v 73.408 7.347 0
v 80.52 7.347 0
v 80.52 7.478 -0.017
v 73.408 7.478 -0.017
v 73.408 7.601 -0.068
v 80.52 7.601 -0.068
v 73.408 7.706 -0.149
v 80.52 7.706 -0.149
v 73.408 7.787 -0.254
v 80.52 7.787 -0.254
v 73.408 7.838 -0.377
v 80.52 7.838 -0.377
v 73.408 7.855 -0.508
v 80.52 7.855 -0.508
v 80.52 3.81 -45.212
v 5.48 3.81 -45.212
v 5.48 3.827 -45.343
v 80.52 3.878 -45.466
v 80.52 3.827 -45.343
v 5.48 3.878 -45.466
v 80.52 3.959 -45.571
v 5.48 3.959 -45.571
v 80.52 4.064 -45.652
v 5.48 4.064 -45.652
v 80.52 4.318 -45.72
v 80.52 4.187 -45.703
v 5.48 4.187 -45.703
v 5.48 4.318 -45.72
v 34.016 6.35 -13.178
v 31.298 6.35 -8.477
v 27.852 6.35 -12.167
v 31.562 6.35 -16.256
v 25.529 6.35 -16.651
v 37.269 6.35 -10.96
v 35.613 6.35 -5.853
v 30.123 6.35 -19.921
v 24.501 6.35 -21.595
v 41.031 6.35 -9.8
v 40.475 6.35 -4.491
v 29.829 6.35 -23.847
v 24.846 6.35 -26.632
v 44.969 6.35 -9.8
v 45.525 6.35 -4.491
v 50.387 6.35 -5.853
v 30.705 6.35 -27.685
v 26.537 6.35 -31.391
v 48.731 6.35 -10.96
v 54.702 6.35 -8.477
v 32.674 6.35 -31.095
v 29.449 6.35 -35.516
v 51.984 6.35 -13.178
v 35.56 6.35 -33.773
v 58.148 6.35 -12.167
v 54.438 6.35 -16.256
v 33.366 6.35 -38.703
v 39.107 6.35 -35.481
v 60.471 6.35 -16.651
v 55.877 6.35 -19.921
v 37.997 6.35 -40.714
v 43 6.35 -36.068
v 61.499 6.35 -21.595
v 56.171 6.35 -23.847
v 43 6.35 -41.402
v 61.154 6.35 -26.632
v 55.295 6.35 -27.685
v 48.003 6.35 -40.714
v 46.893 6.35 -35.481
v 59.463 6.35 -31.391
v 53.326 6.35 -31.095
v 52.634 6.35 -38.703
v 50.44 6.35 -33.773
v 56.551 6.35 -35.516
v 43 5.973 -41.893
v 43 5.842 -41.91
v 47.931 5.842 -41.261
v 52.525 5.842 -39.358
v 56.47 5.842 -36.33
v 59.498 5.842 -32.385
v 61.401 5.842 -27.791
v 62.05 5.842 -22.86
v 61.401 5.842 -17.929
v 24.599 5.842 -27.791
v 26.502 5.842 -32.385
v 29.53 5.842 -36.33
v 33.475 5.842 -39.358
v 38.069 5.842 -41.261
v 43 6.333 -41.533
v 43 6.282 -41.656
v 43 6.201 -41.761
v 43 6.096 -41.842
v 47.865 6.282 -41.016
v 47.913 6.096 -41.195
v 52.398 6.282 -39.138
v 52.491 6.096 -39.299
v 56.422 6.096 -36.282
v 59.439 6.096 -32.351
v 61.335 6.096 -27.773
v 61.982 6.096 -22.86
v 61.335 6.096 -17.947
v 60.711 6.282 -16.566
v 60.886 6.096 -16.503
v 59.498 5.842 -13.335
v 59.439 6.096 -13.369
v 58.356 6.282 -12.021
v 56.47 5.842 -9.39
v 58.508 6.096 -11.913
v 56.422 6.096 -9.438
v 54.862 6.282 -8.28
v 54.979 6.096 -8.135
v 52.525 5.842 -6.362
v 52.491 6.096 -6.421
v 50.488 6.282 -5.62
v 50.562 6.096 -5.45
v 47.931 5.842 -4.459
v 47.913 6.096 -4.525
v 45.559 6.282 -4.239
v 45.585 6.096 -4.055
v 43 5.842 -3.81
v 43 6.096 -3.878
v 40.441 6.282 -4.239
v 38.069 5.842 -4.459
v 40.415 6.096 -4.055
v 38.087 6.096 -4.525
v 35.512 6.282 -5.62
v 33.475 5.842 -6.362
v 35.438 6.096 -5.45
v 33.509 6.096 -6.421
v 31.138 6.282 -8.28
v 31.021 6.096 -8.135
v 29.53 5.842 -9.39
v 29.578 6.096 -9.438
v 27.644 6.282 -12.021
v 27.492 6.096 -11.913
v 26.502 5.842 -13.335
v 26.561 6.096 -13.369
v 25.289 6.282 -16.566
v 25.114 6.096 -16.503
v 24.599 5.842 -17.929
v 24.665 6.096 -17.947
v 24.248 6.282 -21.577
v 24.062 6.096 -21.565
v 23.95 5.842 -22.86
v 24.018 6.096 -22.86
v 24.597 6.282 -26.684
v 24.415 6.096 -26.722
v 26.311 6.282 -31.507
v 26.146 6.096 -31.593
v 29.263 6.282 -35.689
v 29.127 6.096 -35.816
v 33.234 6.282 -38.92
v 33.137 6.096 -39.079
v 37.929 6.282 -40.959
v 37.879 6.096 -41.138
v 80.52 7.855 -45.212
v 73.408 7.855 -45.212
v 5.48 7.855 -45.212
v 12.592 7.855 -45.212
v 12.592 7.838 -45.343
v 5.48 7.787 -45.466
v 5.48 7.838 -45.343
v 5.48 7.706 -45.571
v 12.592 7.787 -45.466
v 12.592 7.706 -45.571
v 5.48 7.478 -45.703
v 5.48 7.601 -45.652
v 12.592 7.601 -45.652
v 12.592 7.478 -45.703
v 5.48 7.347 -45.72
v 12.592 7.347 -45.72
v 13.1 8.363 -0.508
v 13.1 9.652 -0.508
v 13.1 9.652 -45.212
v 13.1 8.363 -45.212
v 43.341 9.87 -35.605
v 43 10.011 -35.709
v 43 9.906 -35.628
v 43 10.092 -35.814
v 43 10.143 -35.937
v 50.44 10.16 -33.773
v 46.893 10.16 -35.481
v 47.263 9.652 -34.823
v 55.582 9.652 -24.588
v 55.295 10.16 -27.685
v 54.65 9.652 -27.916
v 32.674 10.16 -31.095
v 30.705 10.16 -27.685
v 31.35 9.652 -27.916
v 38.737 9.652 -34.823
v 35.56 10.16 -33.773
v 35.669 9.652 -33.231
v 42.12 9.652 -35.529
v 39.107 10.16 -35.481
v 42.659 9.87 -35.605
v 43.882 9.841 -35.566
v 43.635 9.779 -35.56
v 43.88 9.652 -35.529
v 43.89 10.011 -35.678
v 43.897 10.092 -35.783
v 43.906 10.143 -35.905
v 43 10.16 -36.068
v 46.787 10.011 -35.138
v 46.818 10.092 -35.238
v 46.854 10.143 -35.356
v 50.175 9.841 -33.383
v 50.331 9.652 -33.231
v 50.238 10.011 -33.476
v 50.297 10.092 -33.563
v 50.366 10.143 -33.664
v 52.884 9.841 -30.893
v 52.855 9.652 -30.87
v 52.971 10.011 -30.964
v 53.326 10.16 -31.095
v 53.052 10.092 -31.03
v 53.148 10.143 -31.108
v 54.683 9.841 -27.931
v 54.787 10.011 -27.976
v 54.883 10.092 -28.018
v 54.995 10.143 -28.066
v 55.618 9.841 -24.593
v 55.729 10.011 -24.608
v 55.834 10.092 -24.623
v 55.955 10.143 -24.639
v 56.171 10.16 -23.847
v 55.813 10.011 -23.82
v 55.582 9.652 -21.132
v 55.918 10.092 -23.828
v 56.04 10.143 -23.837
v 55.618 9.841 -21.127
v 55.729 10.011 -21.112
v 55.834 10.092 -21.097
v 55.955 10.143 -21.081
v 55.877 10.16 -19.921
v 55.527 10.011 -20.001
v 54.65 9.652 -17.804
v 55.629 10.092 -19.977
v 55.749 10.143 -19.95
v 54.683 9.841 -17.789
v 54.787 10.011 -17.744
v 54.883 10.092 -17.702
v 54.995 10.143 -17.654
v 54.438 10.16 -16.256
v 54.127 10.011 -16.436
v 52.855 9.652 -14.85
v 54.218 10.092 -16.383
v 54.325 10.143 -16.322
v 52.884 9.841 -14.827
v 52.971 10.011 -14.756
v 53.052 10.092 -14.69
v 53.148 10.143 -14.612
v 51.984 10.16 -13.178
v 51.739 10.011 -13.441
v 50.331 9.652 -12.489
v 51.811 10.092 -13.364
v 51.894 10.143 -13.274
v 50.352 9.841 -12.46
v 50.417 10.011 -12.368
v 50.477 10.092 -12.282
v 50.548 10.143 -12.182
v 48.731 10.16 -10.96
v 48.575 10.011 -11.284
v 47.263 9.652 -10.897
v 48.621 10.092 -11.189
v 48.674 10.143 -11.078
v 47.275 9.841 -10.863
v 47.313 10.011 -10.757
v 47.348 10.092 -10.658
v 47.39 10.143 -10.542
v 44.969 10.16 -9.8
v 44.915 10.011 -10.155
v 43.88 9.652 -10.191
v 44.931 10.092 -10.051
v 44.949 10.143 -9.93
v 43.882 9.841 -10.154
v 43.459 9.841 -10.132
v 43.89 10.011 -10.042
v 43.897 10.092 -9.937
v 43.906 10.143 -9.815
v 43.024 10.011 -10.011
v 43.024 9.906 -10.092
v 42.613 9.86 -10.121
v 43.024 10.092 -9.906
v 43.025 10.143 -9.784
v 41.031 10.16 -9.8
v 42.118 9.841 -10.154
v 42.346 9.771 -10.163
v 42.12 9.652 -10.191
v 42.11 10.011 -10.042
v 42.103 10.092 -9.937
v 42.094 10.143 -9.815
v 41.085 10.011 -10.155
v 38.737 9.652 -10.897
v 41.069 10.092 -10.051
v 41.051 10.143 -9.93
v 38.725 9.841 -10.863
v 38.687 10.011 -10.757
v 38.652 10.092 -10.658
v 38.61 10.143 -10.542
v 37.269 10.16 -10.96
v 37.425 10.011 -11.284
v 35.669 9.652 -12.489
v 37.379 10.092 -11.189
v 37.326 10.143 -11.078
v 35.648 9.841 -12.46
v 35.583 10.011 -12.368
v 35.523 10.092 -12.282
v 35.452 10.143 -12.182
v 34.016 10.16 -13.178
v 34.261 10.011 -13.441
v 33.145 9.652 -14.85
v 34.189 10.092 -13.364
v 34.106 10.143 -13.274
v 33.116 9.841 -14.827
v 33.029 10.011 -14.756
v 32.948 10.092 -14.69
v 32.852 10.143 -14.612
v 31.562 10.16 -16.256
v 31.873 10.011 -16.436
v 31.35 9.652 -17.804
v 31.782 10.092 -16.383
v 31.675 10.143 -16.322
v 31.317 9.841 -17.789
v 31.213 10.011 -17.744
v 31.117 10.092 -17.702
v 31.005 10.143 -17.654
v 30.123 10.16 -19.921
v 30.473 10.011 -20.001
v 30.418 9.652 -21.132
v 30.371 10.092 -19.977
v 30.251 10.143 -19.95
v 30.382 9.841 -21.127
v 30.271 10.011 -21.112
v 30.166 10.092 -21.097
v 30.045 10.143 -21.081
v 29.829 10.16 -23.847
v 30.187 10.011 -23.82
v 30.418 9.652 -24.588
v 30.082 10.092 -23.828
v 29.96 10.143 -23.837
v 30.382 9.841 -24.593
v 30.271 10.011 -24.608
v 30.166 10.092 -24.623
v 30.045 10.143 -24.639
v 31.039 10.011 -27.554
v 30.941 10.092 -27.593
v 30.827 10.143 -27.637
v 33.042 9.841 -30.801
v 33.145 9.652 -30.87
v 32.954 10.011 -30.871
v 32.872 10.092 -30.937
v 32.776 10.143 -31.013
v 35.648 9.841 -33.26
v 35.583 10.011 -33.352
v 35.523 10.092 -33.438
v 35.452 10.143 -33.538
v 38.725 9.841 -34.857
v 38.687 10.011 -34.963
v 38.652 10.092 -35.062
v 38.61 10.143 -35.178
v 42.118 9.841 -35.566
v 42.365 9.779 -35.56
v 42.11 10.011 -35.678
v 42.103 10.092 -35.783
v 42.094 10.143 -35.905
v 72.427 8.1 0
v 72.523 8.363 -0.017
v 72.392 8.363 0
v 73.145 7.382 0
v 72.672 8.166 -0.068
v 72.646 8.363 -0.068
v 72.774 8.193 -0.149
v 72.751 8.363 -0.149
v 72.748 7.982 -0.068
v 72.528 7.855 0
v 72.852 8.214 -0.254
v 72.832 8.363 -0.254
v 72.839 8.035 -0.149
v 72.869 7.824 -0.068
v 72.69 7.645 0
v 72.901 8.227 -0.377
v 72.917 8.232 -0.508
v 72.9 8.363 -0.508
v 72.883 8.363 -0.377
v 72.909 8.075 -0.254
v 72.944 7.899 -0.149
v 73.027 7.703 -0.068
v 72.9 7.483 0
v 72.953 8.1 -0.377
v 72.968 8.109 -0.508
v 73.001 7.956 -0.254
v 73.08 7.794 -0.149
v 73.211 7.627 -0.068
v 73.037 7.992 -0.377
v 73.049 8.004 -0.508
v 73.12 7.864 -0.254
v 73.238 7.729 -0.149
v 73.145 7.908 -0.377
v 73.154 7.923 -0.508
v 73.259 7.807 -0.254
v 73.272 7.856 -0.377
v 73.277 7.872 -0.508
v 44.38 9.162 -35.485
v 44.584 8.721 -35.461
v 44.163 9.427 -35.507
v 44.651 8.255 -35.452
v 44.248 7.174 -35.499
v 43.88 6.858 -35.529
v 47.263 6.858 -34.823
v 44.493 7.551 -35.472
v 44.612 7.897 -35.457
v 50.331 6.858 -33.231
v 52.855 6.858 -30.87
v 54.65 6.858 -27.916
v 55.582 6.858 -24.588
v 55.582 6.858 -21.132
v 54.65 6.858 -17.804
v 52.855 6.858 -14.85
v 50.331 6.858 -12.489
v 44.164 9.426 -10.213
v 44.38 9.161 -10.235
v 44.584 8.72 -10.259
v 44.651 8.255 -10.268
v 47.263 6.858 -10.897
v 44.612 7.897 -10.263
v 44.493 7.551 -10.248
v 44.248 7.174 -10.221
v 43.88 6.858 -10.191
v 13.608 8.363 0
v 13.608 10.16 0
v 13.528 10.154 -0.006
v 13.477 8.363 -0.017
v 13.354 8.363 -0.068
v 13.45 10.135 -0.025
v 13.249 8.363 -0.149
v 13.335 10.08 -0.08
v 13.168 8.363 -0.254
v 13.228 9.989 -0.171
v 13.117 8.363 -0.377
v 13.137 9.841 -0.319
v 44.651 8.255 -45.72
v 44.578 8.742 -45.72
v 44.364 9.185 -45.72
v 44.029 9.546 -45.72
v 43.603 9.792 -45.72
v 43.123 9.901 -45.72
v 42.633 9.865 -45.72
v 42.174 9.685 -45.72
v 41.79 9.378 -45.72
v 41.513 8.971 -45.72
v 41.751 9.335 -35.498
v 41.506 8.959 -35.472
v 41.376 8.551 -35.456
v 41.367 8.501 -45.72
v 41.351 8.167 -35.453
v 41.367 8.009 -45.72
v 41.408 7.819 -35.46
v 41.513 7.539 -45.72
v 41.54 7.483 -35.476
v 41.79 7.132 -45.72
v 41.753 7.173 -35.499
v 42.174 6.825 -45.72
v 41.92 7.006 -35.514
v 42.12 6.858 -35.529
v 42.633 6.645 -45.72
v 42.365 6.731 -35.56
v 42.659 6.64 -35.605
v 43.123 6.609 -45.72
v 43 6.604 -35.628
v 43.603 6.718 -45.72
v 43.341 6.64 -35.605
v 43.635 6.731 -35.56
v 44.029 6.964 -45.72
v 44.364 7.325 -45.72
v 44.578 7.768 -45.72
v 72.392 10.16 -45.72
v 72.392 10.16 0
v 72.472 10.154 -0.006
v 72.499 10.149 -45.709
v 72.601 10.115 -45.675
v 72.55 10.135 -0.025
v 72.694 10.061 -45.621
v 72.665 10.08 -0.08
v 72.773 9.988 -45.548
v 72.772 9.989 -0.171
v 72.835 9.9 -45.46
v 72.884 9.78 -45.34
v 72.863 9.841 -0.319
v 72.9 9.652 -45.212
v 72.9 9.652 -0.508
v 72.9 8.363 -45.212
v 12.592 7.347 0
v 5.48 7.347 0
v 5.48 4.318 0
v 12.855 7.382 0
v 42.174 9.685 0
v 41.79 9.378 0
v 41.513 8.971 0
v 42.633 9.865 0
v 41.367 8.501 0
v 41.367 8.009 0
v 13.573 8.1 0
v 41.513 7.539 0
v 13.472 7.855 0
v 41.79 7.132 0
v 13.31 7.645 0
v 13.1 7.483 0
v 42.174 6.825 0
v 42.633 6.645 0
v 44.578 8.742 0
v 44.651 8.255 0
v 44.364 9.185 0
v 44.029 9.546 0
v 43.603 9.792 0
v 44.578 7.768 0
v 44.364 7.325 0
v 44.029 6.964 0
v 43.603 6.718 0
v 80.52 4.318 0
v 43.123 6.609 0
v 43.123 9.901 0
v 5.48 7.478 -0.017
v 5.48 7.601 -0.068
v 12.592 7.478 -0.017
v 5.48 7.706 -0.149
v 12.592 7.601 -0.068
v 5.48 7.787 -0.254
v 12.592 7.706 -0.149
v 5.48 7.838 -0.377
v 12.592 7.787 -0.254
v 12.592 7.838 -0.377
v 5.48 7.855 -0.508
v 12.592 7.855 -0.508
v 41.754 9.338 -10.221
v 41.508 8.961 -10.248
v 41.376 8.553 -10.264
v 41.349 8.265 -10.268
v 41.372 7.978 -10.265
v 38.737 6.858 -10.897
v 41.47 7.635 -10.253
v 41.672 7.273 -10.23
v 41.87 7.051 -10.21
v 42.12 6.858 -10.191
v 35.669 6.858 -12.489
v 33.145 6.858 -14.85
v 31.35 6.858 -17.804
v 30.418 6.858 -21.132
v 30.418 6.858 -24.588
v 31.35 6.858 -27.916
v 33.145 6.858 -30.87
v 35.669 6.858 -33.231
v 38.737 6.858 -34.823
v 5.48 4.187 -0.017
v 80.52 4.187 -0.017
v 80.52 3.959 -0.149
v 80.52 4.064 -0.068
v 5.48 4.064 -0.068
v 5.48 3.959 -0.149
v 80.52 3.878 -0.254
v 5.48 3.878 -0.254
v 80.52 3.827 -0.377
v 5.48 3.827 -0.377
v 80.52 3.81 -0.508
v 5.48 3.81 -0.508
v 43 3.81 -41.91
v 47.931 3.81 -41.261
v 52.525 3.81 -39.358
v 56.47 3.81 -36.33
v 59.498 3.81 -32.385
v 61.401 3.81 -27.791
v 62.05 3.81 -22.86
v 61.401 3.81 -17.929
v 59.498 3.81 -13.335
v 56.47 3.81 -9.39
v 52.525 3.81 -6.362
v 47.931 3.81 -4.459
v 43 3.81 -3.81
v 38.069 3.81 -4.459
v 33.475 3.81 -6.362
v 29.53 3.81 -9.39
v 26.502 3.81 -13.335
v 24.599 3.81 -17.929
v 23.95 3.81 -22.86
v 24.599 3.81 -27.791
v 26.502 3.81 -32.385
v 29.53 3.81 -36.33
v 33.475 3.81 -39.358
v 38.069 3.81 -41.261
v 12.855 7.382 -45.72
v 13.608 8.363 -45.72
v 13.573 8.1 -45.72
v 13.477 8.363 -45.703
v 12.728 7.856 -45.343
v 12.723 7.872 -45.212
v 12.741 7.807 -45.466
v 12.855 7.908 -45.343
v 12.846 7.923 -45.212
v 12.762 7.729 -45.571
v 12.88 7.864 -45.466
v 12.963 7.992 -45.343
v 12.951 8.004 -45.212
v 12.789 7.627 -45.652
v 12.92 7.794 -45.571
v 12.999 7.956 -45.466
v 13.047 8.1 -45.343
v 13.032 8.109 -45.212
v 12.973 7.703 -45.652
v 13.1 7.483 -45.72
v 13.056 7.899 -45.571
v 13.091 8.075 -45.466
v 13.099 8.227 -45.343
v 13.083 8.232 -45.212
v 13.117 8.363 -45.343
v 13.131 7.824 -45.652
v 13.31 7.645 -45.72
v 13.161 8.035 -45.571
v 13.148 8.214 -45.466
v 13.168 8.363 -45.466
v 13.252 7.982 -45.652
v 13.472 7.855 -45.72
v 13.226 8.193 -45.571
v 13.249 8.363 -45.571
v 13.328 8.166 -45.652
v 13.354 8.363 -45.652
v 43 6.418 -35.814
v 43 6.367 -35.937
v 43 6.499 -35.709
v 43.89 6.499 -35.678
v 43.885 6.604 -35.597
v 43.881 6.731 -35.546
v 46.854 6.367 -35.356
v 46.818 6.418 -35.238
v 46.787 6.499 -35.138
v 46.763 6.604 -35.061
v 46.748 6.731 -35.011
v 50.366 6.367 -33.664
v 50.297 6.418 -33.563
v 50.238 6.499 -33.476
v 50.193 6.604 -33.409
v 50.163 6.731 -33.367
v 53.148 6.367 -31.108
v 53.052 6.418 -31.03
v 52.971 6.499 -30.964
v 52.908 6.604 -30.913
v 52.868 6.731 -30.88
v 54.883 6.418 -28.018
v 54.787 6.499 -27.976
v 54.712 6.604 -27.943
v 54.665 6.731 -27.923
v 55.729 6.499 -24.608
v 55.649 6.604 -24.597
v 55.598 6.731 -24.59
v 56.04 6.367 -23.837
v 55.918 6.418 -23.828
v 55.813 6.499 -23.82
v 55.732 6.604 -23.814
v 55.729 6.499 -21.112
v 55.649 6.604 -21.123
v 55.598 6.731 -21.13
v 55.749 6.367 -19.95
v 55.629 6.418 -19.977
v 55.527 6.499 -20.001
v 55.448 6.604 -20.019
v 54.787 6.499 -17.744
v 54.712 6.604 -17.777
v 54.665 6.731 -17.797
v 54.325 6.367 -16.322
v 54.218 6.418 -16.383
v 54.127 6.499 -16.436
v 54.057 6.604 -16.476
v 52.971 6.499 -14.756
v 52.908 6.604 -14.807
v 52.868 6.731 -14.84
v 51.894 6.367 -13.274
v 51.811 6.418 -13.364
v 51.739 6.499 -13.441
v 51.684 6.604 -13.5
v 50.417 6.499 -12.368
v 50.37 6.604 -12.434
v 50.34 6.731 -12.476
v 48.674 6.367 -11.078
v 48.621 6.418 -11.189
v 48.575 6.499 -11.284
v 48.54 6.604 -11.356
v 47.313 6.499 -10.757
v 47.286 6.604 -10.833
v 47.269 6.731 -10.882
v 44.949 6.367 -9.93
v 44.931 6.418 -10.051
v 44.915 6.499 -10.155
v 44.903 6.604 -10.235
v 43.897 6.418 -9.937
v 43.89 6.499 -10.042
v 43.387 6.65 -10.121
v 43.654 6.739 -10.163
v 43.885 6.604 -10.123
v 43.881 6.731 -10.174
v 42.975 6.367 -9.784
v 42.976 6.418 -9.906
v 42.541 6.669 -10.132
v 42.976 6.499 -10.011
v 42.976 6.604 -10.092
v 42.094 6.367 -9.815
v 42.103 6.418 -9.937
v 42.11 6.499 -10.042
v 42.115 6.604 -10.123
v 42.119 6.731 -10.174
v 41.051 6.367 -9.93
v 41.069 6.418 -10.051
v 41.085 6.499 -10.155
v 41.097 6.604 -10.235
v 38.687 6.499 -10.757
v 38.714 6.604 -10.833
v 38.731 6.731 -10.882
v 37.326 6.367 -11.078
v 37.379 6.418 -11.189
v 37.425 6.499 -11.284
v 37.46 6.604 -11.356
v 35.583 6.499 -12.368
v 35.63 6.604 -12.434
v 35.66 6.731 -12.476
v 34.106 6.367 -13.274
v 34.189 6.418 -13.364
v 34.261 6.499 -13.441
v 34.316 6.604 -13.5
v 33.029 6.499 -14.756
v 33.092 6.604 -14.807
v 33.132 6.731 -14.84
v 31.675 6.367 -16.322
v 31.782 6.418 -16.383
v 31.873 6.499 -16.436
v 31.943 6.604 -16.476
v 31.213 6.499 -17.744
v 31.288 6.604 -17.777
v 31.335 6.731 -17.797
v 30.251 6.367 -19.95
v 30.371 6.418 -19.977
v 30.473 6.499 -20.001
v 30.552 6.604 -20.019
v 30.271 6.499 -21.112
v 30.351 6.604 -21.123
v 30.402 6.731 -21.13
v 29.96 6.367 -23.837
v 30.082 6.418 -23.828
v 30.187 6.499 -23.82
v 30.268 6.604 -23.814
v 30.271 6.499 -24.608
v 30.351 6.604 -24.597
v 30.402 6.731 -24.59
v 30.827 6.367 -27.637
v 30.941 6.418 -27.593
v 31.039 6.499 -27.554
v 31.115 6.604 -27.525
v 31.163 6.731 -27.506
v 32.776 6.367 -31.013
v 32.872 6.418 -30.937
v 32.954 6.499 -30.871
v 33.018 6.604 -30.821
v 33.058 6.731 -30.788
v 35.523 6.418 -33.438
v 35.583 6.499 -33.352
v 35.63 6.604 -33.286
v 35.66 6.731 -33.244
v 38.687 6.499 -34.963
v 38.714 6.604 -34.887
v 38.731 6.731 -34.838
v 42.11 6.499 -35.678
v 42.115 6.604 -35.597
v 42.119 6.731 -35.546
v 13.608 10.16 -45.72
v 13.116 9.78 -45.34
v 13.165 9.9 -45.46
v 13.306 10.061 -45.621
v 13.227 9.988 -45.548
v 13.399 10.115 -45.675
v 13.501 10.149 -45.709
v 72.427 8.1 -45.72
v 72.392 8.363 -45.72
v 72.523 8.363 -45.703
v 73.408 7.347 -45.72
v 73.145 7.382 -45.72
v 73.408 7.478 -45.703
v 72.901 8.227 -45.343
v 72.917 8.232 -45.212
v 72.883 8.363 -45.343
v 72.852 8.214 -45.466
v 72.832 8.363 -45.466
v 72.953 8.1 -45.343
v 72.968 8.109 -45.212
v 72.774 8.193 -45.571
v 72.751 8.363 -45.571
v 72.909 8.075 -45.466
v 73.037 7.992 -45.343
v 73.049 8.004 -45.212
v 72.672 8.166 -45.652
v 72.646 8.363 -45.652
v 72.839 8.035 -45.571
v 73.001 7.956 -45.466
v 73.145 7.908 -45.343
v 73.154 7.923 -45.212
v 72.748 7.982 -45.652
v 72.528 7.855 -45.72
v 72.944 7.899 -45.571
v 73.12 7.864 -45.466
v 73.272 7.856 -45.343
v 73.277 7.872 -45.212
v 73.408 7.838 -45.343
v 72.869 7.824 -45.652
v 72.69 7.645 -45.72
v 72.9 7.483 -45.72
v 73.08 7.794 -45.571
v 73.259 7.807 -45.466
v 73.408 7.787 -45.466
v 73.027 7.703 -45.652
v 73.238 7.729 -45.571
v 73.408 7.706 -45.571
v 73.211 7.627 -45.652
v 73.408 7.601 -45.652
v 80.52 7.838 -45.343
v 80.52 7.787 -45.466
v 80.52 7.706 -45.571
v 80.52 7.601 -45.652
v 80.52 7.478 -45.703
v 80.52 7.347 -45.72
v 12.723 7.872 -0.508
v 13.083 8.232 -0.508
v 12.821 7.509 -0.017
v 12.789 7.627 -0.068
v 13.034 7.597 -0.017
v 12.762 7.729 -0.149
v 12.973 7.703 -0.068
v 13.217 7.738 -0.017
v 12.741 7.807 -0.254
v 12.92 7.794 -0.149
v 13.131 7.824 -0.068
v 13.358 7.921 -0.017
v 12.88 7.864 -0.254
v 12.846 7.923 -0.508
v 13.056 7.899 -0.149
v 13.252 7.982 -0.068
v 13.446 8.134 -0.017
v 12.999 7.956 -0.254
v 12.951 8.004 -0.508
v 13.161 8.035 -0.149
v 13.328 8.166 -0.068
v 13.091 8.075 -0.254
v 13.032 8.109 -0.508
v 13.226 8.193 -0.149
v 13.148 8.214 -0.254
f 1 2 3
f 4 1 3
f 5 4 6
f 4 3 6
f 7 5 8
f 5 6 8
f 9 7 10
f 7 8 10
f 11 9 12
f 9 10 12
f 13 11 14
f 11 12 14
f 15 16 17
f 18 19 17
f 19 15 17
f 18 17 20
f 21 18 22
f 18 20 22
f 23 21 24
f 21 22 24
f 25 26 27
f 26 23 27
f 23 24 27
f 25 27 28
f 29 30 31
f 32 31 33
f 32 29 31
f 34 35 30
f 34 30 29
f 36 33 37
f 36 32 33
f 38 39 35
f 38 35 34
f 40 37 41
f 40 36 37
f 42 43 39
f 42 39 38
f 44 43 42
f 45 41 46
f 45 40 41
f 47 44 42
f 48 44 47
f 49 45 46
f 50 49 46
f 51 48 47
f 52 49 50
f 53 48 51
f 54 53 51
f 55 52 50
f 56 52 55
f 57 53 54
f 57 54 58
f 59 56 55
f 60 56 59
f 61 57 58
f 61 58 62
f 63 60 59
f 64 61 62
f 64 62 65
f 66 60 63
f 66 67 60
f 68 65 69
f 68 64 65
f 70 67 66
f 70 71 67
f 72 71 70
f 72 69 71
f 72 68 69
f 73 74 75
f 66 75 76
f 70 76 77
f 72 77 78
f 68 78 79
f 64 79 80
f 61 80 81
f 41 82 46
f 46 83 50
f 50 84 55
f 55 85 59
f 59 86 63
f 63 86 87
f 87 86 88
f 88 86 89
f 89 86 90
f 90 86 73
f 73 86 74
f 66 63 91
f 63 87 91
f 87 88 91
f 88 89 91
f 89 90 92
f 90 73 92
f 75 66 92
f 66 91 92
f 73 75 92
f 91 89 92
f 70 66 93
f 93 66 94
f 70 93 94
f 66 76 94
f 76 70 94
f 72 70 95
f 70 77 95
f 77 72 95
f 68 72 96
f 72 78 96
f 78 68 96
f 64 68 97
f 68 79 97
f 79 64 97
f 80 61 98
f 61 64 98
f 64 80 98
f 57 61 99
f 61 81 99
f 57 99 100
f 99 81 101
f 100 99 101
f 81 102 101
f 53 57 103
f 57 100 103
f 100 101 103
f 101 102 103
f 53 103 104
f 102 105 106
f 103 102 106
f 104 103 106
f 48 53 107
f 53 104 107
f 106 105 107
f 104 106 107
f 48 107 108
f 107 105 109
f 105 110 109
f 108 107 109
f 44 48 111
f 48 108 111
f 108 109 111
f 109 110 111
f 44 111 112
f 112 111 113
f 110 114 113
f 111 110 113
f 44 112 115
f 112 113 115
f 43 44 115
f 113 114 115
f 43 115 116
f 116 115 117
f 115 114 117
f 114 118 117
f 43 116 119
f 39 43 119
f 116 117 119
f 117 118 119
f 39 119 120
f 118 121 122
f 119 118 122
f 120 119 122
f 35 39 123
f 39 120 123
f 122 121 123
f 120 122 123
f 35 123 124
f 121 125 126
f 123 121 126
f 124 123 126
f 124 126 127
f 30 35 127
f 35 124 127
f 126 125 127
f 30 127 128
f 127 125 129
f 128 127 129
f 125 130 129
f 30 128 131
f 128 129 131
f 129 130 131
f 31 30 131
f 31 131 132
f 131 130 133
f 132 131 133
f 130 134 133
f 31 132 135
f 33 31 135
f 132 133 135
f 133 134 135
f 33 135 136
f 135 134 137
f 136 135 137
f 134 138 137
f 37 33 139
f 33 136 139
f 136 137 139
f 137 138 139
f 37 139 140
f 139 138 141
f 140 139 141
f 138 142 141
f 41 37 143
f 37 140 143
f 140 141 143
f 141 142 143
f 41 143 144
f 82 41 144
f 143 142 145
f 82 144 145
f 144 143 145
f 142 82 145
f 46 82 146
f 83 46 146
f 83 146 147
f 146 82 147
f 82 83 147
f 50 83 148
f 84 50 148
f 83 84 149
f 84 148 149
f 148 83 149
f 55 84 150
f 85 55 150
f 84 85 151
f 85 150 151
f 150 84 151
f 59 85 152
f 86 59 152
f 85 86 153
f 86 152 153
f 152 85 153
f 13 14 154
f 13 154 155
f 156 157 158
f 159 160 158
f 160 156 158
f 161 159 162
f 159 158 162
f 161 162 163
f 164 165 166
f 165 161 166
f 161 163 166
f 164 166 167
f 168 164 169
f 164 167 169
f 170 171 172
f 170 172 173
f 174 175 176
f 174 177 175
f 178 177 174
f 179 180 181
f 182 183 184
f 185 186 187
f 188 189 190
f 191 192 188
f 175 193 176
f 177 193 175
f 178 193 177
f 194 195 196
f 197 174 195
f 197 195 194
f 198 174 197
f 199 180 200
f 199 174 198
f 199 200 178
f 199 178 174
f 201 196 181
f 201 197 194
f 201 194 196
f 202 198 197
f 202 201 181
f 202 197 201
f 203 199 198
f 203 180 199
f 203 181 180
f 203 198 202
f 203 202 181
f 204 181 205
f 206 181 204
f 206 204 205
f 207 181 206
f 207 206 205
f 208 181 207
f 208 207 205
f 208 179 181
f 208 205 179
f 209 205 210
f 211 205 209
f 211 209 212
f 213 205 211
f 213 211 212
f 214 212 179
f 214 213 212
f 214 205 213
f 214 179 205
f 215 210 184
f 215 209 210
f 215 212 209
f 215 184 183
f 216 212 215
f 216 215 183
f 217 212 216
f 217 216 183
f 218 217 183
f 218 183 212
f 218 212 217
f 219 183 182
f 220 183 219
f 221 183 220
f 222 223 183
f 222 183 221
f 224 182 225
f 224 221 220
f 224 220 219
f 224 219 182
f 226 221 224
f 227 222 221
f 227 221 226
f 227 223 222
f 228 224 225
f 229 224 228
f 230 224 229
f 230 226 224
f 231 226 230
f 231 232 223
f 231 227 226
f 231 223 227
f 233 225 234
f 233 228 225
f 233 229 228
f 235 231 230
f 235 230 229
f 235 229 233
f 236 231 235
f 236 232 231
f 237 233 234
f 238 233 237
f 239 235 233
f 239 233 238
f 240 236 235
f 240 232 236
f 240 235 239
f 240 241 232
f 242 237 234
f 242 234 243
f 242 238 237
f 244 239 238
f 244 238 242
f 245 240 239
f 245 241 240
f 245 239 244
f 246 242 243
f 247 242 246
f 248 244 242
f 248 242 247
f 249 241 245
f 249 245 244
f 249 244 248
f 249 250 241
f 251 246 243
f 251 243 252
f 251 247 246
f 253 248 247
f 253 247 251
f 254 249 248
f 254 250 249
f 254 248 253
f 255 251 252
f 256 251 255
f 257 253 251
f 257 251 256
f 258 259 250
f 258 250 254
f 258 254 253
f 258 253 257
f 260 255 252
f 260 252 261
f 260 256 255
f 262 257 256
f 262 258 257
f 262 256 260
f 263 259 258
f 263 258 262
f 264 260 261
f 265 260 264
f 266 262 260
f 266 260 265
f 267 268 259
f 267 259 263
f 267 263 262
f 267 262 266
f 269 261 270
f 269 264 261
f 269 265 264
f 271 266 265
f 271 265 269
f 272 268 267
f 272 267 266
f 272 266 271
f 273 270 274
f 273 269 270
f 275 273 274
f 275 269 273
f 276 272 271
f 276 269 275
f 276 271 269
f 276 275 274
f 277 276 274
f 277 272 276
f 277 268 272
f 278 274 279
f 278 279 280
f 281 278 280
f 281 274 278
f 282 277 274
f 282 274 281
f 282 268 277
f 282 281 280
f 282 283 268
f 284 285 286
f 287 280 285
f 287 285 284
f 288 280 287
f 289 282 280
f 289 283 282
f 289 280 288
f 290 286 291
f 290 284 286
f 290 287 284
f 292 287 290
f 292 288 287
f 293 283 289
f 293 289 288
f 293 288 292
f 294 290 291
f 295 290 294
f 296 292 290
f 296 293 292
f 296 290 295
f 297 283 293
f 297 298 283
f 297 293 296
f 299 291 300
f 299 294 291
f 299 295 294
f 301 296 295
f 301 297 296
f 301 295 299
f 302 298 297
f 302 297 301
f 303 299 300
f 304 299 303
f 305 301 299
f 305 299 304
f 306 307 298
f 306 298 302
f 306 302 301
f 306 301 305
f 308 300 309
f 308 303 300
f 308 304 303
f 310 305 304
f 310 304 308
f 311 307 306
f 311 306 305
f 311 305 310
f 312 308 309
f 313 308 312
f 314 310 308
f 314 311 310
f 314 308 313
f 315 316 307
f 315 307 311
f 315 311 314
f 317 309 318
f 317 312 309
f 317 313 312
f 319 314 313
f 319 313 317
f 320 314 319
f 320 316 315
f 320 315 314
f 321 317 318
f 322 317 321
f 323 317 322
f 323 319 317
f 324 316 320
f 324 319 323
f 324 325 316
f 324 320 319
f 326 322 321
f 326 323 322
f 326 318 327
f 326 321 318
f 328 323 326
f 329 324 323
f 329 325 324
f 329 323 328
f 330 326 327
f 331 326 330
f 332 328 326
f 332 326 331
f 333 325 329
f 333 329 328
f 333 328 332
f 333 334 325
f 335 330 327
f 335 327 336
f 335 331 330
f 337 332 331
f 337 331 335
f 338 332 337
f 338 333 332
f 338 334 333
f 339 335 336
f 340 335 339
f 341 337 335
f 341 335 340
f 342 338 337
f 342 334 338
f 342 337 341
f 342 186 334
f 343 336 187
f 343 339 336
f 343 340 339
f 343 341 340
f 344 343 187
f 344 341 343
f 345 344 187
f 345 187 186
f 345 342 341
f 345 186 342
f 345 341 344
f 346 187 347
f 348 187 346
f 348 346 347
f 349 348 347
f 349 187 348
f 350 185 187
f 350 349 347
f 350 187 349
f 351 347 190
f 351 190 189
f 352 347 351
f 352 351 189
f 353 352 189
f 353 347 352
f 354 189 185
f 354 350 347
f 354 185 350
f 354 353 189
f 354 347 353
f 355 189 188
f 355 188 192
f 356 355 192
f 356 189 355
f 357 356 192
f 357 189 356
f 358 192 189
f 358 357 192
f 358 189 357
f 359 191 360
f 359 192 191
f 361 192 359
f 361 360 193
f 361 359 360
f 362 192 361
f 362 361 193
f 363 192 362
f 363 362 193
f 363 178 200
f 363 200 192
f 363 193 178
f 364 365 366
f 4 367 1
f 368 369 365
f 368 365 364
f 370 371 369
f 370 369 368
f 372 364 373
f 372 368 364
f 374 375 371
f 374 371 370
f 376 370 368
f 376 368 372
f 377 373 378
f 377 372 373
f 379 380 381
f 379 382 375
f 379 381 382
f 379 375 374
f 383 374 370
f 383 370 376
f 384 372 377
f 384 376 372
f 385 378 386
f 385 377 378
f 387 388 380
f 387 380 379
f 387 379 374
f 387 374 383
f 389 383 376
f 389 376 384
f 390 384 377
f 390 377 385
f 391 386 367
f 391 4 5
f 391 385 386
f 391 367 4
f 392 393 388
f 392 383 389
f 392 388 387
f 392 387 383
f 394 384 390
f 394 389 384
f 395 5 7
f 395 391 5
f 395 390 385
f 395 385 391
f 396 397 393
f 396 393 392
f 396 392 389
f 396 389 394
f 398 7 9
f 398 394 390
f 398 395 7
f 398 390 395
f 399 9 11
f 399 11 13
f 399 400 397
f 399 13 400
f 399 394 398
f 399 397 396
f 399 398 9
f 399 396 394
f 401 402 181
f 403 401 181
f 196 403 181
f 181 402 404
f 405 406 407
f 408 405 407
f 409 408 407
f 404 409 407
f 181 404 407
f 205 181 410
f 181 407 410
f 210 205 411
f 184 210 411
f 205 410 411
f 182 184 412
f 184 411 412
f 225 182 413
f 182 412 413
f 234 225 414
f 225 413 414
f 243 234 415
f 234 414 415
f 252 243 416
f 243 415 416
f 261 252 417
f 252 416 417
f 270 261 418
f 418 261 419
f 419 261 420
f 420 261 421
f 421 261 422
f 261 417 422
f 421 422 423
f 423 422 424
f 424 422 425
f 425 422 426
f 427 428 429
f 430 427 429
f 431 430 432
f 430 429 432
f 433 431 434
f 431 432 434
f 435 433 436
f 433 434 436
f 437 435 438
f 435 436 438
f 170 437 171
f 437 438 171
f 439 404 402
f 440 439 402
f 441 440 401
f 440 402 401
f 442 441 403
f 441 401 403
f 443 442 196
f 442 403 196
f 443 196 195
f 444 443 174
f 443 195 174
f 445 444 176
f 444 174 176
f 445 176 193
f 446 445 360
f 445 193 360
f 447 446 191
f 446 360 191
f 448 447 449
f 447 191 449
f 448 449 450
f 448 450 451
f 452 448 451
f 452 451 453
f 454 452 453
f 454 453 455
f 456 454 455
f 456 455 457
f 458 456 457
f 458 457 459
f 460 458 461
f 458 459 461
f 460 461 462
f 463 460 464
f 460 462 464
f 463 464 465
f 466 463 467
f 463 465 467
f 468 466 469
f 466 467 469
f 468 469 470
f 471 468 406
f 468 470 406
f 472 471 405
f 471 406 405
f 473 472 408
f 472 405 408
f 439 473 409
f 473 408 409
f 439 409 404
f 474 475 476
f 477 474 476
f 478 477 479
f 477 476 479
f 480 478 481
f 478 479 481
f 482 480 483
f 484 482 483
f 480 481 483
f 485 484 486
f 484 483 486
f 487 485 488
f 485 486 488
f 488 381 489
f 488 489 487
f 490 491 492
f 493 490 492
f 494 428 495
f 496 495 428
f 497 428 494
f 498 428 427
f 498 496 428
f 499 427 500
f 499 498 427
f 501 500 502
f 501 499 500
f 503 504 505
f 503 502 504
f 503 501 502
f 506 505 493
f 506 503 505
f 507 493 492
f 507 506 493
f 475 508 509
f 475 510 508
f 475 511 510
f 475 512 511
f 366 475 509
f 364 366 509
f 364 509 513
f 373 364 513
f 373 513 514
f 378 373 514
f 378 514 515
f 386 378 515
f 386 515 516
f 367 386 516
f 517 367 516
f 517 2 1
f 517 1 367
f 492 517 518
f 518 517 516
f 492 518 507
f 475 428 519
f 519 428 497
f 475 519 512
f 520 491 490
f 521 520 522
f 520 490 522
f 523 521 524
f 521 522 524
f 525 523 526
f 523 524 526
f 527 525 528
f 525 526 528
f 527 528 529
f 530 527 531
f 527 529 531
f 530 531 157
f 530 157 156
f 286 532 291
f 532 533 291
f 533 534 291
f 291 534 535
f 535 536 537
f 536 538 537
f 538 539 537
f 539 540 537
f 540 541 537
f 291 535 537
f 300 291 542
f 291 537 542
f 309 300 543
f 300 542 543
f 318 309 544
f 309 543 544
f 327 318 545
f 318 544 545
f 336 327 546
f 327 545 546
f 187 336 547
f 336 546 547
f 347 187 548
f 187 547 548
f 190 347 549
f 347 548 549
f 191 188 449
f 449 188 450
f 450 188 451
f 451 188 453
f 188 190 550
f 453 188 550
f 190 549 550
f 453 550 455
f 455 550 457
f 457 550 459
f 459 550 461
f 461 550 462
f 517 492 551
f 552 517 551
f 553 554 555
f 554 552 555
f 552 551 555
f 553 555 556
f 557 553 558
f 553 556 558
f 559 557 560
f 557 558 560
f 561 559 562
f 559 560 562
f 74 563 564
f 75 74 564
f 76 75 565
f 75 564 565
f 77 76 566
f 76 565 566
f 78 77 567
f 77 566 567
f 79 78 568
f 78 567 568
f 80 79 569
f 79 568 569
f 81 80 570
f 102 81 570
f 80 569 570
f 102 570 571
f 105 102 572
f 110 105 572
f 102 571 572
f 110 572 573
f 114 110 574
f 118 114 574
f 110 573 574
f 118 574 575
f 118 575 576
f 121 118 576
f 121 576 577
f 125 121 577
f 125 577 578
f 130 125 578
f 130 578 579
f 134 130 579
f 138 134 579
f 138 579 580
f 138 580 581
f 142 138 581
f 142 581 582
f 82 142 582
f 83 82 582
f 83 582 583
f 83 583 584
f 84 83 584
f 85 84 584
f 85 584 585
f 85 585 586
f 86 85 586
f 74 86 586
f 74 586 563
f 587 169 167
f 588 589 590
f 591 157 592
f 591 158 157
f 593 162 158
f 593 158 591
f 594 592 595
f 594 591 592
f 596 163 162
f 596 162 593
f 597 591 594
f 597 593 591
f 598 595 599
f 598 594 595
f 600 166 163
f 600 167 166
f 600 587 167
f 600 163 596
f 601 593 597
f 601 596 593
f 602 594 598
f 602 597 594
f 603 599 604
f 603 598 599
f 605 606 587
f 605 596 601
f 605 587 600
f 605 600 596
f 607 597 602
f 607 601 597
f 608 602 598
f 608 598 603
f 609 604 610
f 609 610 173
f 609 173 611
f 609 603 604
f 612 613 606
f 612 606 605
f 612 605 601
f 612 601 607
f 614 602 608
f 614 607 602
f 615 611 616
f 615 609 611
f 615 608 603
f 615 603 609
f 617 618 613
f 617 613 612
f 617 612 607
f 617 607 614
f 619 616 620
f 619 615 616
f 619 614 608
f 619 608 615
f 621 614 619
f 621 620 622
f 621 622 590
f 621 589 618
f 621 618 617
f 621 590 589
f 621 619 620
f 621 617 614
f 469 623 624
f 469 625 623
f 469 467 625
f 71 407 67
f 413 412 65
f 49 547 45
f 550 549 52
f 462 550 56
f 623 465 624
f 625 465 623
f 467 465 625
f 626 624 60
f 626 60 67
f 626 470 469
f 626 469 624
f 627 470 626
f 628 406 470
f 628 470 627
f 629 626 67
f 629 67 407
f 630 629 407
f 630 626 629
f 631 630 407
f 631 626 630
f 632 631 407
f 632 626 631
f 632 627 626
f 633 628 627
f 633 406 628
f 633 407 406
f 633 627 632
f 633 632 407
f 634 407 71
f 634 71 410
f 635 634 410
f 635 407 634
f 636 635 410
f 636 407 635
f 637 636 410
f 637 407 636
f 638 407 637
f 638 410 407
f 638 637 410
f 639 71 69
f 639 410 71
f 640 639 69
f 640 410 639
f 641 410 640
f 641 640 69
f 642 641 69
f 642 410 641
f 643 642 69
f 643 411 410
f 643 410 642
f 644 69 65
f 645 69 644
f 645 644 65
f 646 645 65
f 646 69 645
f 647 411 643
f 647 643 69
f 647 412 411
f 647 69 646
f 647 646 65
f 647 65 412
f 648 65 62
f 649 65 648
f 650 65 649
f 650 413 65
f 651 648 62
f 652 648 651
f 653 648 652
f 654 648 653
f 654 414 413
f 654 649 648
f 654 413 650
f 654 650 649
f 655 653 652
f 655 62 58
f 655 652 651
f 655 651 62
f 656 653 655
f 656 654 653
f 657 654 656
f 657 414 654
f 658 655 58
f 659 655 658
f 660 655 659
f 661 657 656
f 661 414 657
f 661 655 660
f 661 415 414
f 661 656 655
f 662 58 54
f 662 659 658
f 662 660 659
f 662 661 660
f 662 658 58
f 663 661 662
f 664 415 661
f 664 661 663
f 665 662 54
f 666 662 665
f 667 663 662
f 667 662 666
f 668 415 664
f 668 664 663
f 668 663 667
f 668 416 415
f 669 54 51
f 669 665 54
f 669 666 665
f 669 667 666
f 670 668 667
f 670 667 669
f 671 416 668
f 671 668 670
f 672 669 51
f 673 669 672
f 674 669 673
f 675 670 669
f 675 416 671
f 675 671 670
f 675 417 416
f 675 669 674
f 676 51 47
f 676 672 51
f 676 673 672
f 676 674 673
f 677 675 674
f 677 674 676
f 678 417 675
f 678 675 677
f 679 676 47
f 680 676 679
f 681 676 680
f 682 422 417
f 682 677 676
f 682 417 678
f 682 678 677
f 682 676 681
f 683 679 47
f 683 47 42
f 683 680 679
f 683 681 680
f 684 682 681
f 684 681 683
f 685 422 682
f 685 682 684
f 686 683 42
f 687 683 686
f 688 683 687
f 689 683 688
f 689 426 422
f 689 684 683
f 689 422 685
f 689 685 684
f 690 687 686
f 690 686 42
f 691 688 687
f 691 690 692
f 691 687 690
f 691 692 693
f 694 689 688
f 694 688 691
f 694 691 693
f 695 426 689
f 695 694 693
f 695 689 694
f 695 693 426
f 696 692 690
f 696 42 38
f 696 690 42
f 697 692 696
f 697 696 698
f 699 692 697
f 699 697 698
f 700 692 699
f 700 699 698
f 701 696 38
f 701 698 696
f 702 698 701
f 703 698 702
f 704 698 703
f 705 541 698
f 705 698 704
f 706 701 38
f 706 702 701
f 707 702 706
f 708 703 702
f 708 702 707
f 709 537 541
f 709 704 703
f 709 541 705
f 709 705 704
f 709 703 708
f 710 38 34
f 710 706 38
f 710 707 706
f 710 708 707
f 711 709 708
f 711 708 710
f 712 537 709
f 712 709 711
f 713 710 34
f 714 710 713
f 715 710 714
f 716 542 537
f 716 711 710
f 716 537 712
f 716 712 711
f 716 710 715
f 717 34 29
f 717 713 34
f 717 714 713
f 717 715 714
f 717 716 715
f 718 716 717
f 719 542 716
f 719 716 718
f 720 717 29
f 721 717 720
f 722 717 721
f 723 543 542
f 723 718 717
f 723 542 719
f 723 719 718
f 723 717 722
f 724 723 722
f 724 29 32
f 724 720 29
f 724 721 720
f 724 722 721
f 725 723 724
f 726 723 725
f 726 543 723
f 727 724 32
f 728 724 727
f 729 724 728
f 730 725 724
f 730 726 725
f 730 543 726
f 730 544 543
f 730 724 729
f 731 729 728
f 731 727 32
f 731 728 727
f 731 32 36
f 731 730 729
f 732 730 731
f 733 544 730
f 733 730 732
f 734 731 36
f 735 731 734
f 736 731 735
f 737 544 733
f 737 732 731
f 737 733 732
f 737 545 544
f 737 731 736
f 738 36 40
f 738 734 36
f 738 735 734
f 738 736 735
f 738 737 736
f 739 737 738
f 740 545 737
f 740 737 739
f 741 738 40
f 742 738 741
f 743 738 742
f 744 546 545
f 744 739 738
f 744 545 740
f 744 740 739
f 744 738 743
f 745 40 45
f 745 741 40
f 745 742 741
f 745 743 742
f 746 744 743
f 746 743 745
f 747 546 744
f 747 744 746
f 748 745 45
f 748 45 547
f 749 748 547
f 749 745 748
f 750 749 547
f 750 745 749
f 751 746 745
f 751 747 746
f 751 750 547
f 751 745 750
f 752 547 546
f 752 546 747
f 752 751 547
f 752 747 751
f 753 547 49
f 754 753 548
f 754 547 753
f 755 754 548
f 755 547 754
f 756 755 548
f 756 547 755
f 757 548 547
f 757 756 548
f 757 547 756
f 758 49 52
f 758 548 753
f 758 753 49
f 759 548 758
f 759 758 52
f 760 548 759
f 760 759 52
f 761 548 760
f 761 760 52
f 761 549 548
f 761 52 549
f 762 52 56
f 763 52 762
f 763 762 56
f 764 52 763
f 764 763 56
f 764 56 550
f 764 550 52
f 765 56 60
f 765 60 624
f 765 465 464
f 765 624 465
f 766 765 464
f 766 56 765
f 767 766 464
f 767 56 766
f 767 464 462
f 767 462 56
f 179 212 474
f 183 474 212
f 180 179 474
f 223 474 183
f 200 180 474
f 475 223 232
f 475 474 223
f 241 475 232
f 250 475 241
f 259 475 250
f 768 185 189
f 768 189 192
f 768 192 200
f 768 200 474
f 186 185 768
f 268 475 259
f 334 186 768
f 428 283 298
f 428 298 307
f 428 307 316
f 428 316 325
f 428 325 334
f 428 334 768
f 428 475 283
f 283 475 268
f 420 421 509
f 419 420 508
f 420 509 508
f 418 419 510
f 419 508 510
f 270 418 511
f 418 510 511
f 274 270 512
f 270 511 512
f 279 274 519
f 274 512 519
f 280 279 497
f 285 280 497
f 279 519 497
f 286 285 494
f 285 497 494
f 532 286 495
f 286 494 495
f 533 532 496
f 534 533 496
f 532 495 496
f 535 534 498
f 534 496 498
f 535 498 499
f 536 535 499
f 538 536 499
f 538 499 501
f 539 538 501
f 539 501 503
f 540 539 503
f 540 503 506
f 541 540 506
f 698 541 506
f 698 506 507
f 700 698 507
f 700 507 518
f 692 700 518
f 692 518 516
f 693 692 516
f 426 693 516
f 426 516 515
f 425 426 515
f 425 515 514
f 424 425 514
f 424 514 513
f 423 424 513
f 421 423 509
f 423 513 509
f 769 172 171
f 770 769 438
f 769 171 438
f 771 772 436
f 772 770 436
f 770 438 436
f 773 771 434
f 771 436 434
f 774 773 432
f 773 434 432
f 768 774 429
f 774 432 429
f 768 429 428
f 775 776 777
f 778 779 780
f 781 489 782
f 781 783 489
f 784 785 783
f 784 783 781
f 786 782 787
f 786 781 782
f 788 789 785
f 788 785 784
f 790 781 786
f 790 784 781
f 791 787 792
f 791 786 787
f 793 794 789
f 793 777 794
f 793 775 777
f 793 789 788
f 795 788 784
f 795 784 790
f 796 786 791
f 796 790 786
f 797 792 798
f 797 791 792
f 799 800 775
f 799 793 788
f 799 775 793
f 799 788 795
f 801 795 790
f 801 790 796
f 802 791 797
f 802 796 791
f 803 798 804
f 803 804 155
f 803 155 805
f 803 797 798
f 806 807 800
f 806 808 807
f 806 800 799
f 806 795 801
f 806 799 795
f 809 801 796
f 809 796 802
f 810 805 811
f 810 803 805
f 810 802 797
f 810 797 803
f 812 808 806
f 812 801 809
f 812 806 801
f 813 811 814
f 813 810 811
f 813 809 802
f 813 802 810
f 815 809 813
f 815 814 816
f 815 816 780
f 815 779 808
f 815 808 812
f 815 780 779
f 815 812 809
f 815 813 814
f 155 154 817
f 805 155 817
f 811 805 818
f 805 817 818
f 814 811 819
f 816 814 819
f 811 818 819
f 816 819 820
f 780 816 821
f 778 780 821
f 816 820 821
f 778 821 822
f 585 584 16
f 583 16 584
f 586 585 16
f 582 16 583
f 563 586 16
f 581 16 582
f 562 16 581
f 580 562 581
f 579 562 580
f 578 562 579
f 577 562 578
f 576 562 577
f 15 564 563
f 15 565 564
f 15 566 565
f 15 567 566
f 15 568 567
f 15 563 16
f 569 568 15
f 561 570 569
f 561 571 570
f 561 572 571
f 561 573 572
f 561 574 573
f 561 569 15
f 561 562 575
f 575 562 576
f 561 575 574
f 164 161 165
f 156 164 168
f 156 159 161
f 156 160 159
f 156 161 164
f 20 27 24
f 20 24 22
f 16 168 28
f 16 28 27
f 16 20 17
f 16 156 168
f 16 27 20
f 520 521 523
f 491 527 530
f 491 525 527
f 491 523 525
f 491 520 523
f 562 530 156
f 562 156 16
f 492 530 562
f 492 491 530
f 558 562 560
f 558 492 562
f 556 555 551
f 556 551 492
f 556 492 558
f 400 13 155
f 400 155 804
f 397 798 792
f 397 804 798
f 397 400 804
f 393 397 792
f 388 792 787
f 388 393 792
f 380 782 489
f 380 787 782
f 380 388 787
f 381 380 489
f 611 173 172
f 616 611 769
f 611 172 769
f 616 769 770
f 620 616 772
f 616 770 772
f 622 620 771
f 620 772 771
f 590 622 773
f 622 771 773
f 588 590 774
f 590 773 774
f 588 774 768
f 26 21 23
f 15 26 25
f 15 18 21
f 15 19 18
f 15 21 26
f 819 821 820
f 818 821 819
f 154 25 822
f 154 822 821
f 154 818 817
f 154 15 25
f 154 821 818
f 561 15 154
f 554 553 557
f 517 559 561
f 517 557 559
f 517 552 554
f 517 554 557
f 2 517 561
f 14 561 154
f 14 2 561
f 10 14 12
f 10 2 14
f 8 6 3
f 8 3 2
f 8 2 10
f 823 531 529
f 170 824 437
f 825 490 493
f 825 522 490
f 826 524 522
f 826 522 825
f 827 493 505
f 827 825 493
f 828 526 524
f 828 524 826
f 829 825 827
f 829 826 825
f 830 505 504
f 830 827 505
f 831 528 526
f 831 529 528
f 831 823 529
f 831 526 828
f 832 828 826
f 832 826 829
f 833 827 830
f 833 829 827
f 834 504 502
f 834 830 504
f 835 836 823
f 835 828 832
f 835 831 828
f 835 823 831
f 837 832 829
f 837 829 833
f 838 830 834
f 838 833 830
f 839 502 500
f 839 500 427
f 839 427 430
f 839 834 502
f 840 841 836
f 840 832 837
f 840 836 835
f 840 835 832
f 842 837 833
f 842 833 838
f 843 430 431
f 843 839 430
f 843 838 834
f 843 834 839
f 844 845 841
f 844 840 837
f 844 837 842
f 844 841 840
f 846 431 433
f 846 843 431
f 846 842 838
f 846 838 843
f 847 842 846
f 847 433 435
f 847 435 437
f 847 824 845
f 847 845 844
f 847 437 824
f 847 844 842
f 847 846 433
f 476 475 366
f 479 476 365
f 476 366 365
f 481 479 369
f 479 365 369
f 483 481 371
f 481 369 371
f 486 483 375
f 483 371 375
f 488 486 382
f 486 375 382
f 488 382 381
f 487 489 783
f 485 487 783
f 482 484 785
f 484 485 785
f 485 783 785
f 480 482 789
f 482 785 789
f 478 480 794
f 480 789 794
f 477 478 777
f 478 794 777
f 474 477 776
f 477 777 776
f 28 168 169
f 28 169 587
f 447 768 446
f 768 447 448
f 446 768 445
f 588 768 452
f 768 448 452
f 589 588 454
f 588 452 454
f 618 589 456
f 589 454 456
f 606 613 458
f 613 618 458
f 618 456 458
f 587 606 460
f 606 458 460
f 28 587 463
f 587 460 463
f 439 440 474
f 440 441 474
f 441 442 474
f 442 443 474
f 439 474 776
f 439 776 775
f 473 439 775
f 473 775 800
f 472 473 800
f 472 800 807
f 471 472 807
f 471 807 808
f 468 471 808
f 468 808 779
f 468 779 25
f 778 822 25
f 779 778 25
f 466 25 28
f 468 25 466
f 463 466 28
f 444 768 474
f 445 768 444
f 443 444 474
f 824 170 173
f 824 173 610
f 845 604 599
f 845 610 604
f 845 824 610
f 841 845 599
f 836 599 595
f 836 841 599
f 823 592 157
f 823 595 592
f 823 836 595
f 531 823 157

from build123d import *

# Parameters (mm, degrees)
BOSS_EXTRUDE1_DEPTH = 45.72
CUT_EXTRUDE1_REACH  = 94.812
SKETCH2_R           = 12.7
SKETCH4_R           = 19.05
CUT_EXTRUDE2_DEPTH  = 2.54
SKETCH5_R           = 1.651
CUT_EXTRUDE3_DEPTH  = 94.150493289
FILLET1_R           = 0.508


with BuildPart() as part:
    # Sketch1 → Boss-Extrude1 (new body)
    with BuildSketch(Plane.XY):
        Polygon((13.1, 7.855), (5.48, 7.855), (5.48, 3.81), (80.52, 3.81), (80.52, 7.855), (72.9, 7.855), (72.9, 10.16), (13.1, 10.16), align=None)
    extrude(amount=-BOSS_EXTRUDE1_DEPTH)

    # Sketch2 → Cut-Extrude1 (cut, up to next)
    with BuildSketch(Plane.XZ.offset(-3.81), mode=Mode.PRIVATE) as cut_extrude1_sk1:
        with Locations(Location((43, -22.86, 0), (0, 0, 270))):
            Circle(SKETCH2_R)
    cut_extrude1_tool1 = extrude(cut_extrude1_sk1.sketch, amount=-CUT_EXTRUDE1_REACH, mode=Mode.PRIVATE) & part.part
    add(cut_extrude1_tool1.solids().sort_by_distance((43, 3.81, -22.86))[0], mode=Mode.SUBTRACT)

    # Sketch4 → Cut-Extrude2 (cut)
    with BuildSketch(Plane.XZ.offset(-3.81)):
        with Locations(Location((43, -22.86, 0), (0, 0, 270))):
            Circle(SKETCH4_R)
    extrude(amount=-CUT_EXTRUDE2_DEPTH, mode=Mode.SUBTRACT)

    # Sketch5 → Cut-Extrude3 (cut, through all)
    with BuildSketch(Plane.XY):
        with Locations((43, 8.255)):
            Circle(SKETCH5_R)
    extrude(amount=-CUT_EXTRUDE3_DEPTH, mode=Mode.SUBTRACT)

    # Fillet1
    # the kernel refuses this fillet: 0.508 mm, written as the material it adds along each edge
    with BuildSketch(Plane(origin=(43, 6.35, -22.86), x_dir=(0, 0, -1), z_dir=(-1, 0, 0))) as fillet1_piece_1:
        with BuildLine():
            CenterArc((19.05 - FILLET1_R, FILLET1_R), FILLET1_R, 270, 90)
            Line((19.05 - FILLET1_R, 0), (19.05, 0))
            Line((19.05, 0), (19.05, FILLET1_R))
        make_face()
    revolve(axis=Axis((43, 6.35, -22.86), (0, -1, 0)))
    with BuildSketch(Plane(origin=(72.9, 7.855, 0), x_dir=(0, 1, 0), z_dir=(0, 0, -1)), Plane(origin=(13.1, 7.855, 0), x_dir=(-1, 0, 0), z_dir=(0, 0, -1))) as fillet1_piece_2:
        with BuildLine():
            CenterArc((FILLET1_R, FILLET1_R), FILLET1_R, 180, 90)
            Line((0, FILLET1_R), (0, 0))
            Line((0, 0), (FILLET1_R, 0))
        make_face()
    extrude(amount=45.72)
    # the kernel refuses this fillet: 0.508 mm, written as the material it takes off along each edge
    with BuildSketch(Plane(origin=(72.9, 8.363, -45.72), x_dir=(-1, 0, 0), z_dir=(0, 1, 0)), Plane(origin=(13.1, 11.43, -45.72), x_dir=(1, 0, 0), z_dir=(0, -1, 0))) as fillet1_2_piece_1:
        with BuildLine():
            CenterArc((FILLET1_R, FILLET1_R), FILLET1_R, 180, 90)
            Line((0, FILLET1_R), (0, 0))
            Line((0, 0), (FILLET1_R, 0))
        make_face()
    extrude(amount=3.067, mode=Mode.SUBTRACT)
    with BuildSketch(Plane(origin=(72.9, 8.363, 0), x_dir=(-1, 0, 0), z_dir=(0, 1, 0)), Plane(origin=(13.1, 11.43, 0), x_dir=(1, 0, 0), z_dir=(0, -1, 0))) as fillet1_2_piece_2:
        with BuildLine():
            CenterArc((FILLET1_R, -FILLET1_R), FILLET1_R, 90, 90)
            Line((0, -FILLET1_R), (0, 0))
            Line((0, 0), (FILLET1_R, 0))
        make_face()
    extrude(amount=3.067, mode=Mode.SUBTRACT)
    with BuildSketch(Plane(origin=(43, 6.35, -22.86), x_dir=(0, 0, -1), z_dir=(-1, 0, 0))) as fillet1_2_piece_3:
        with BuildLine():
            CenterArc((12.7 + FILLET1_R, -FILLET1_R), FILLET1_R, 90, 90)
            Line((12.7 + FILLET1_R, 0), (12.7, 0))
            Line((12.7, 0), (12.7, -FILLET1_R))
        make_face()
    revolve(axis=Axis((43, 6.35, -22.86), (0, -1, 0)), mode=Mode.SUBTRACT)
    with BuildSketch(Plane(origin=(4.21, 3.81, -45.72), x_dir=(0, 1, 0), z_dir=(1, 0, 0))) as fillet1_2_piece_4:
        with BuildLine():
            CenterArc((FILLET1_R, FILLET1_R), FILLET1_R, 180, 90)
            Line((0, FILLET1_R), (0, 0))
            Line((0, 0), (FILLET1_R, 0))
        make_face()
    extrude(amount=77.58, mode=Mode.SUBTRACT)
    with BuildSketch(Plane(origin=(4.21, 3.81, 0), x_dir=(0, 1, 0), z_dir=(1, 0, 0))) as fillet1_2_piece_5:
        with BuildLine():
            CenterArc((FILLET1_R, -FILLET1_R), FILLET1_R, 90, 90)
            Line((0, -FILLET1_R), (0, 0))
            Line((0, 0), (FILLET1_R, 0))
        make_face()
    extrude(amount=77.58, mode=Mode.SUBTRACT)
    with BuildSketch(Plane(origin=(81.79, 7.855, -45.72), x_dir=(0, -1, 0), z_dir=(-1, 0, 0)), Plane(origin=(12.592, 7.855, 0), x_dir=(0, 0, -1), z_dir=(-1, 0, 0))) as fillet1_2_piece_6:
        with BuildLine():
            CenterArc((FILLET1_R, FILLET1_R), FILLET1_R, 180, 90)
            Line((0, FILLET1_R), (0, 0))
            Line((0, 0), (FILLET1_R, 0))
        make_face()
    extrude(amount=8.382, mode=Mode.SUBTRACT)
    with BuildSketch(Plane(origin=(81.79, 7.855, 0), x_dir=(0, -1, 0), z_dir=(-1, 0, 0)), Plane(origin=(12.592, 7.855, -45.72), x_dir=(0, 0, 1), z_dir=(-1, 0, 0))) as fillet1_2_piece_7:
        with BuildLine():
            CenterArc((FILLET1_R, -FILLET1_R), FILLET1_R, 90, 90)
            Line((0, -FILLET1_R), (0, 0))
            Line((0, 0), (FILLET1_R, 0))
        make_face()
    extrude(amount=8.382, mode=Mode.SUBTRACT)
    with BuildSketch(Plane(origin=(72.9, 10.16, 1.27), x_dir=(-1, 0, 0), z_dir=(0, 0, -1)), Plane(origin=(13.1, 10.16, 1.27), x_dir=(0, -1, 0), z_dir=(0, 0, -1))) as fillet1_2_piece_8:
        with BuildLine():
            CenterArc((FILLET1_R, -FILLET1_R), FILLET1_R, 90, 90)
            Line((0, -FILLET1_R), (0, 0))
            Line((0, 0), (FILLET1_R, 0))
        make_face()
    extrude(amount=48.26, mode=Mode.SUBTRACT)
    with BuildSketch(Plane(origin=(43, 10.16, -22.86), x_dir=(0, 0, -1), z_dir=(-1, 0, 0))) as fillet1_2_piece_9:
        with BuildLine():
            CenterArc((12.7 + FILLET1_R, FILLET1_R), FILLET1_R, 180, 90)
            Line((12.7, FILLET1_R), (12.7, 0))
            Line((12.7, 0), (12.7 + FILLET1_R, 0))
        make_face()
    revolve(axis=Axis((43, 10.16, -22.86), (0, -1, 0)), mode=Mode.SUBTRACT)
    with BuildSketch(Plane(origin=(12.592, 8.363, 0), x_dir=(0, -1, 0), z_dir=(-1, 0, 0))) as fillet1_2_piece_10:
        with BuildLine():
            CenterArc((0.508 + FILLET1_R, -FILLET1_R), FILLET1_R, 90, 90)
            Line((0.508, -FILLET1_R), (0.508, 0))
            Line((0.508, 0), (0.508 + FILLET1_R, 0))
        make_face()
    revolve(axis=Axis((12.592, 8.363, 0), (0, 0, 1)), revolution_arc=90, mode=Mode.SUBTRACT)
    with BuildSketch(Plane(origin=(12.592, 8.363, -45.72), x_dir=(0, -1, 0), z_dir=(-1, 0, 0))) as fillet1_2_piece_11:
        with BuildLine():
            CenterArc((0.508 + FILLET1_R, FILLET1_R), FILLET1_R, 180, 90)
            Line((0.508, FILLET1_R), (0.508, 0))
            Line((0.508, 0), (0.508 + FILLET1_R, 0))
        make_face()
    revolve(axis=Axis((12.592, 8.363, -45.72), (0, 0, 1)), revolution_arc=90, mode=Mode.SUBTRACT)
    with BuildSketch(Plane(origin=(73.408, 8.363, 0), x_dir=(-1, 0, 0), z_dir=(0, 1, 0))) as fillet1_2_piece_12:
        with BuildLine():
            CenterArc((0.508 + FILLET1_R, -FILLET1_R), FILLET1_R, 90, 90)
            Line((0.508, -FILLET1_R), (0.508, 0))
            Line((0.508, 0), (0.508 + FILLET1_R, 0))
        make_face()
    revolve(axis=Axis((73.408, 8.363, 0), (0, 0, 1)), revolution_arc=90, mode=Mode.SUBTRACT)
    with BuildSketch(Plane(origin=(73.408, 8.363, -45.72), x_dir=(-1, 0, 0), z_dir=(0, 1, 0))) as fillet1_2_piece_13:
        with BuildLine():
            CenterArc((0.508 + FILLET1_R, FILLET1_R), FILLET1_R, 180, 90)
            Line((0.508, FILLET1_R), (0.508, 0))
            Line((0.508, 0), (0.508 + FILLET1_R, 0))
        make_face()
    revolve(axis=Axis((73.408, 8.363, -45.72), (0, 0, 1)), revolution_arc=90, mode=Mode.SUBTRACT)


solid = part.part
